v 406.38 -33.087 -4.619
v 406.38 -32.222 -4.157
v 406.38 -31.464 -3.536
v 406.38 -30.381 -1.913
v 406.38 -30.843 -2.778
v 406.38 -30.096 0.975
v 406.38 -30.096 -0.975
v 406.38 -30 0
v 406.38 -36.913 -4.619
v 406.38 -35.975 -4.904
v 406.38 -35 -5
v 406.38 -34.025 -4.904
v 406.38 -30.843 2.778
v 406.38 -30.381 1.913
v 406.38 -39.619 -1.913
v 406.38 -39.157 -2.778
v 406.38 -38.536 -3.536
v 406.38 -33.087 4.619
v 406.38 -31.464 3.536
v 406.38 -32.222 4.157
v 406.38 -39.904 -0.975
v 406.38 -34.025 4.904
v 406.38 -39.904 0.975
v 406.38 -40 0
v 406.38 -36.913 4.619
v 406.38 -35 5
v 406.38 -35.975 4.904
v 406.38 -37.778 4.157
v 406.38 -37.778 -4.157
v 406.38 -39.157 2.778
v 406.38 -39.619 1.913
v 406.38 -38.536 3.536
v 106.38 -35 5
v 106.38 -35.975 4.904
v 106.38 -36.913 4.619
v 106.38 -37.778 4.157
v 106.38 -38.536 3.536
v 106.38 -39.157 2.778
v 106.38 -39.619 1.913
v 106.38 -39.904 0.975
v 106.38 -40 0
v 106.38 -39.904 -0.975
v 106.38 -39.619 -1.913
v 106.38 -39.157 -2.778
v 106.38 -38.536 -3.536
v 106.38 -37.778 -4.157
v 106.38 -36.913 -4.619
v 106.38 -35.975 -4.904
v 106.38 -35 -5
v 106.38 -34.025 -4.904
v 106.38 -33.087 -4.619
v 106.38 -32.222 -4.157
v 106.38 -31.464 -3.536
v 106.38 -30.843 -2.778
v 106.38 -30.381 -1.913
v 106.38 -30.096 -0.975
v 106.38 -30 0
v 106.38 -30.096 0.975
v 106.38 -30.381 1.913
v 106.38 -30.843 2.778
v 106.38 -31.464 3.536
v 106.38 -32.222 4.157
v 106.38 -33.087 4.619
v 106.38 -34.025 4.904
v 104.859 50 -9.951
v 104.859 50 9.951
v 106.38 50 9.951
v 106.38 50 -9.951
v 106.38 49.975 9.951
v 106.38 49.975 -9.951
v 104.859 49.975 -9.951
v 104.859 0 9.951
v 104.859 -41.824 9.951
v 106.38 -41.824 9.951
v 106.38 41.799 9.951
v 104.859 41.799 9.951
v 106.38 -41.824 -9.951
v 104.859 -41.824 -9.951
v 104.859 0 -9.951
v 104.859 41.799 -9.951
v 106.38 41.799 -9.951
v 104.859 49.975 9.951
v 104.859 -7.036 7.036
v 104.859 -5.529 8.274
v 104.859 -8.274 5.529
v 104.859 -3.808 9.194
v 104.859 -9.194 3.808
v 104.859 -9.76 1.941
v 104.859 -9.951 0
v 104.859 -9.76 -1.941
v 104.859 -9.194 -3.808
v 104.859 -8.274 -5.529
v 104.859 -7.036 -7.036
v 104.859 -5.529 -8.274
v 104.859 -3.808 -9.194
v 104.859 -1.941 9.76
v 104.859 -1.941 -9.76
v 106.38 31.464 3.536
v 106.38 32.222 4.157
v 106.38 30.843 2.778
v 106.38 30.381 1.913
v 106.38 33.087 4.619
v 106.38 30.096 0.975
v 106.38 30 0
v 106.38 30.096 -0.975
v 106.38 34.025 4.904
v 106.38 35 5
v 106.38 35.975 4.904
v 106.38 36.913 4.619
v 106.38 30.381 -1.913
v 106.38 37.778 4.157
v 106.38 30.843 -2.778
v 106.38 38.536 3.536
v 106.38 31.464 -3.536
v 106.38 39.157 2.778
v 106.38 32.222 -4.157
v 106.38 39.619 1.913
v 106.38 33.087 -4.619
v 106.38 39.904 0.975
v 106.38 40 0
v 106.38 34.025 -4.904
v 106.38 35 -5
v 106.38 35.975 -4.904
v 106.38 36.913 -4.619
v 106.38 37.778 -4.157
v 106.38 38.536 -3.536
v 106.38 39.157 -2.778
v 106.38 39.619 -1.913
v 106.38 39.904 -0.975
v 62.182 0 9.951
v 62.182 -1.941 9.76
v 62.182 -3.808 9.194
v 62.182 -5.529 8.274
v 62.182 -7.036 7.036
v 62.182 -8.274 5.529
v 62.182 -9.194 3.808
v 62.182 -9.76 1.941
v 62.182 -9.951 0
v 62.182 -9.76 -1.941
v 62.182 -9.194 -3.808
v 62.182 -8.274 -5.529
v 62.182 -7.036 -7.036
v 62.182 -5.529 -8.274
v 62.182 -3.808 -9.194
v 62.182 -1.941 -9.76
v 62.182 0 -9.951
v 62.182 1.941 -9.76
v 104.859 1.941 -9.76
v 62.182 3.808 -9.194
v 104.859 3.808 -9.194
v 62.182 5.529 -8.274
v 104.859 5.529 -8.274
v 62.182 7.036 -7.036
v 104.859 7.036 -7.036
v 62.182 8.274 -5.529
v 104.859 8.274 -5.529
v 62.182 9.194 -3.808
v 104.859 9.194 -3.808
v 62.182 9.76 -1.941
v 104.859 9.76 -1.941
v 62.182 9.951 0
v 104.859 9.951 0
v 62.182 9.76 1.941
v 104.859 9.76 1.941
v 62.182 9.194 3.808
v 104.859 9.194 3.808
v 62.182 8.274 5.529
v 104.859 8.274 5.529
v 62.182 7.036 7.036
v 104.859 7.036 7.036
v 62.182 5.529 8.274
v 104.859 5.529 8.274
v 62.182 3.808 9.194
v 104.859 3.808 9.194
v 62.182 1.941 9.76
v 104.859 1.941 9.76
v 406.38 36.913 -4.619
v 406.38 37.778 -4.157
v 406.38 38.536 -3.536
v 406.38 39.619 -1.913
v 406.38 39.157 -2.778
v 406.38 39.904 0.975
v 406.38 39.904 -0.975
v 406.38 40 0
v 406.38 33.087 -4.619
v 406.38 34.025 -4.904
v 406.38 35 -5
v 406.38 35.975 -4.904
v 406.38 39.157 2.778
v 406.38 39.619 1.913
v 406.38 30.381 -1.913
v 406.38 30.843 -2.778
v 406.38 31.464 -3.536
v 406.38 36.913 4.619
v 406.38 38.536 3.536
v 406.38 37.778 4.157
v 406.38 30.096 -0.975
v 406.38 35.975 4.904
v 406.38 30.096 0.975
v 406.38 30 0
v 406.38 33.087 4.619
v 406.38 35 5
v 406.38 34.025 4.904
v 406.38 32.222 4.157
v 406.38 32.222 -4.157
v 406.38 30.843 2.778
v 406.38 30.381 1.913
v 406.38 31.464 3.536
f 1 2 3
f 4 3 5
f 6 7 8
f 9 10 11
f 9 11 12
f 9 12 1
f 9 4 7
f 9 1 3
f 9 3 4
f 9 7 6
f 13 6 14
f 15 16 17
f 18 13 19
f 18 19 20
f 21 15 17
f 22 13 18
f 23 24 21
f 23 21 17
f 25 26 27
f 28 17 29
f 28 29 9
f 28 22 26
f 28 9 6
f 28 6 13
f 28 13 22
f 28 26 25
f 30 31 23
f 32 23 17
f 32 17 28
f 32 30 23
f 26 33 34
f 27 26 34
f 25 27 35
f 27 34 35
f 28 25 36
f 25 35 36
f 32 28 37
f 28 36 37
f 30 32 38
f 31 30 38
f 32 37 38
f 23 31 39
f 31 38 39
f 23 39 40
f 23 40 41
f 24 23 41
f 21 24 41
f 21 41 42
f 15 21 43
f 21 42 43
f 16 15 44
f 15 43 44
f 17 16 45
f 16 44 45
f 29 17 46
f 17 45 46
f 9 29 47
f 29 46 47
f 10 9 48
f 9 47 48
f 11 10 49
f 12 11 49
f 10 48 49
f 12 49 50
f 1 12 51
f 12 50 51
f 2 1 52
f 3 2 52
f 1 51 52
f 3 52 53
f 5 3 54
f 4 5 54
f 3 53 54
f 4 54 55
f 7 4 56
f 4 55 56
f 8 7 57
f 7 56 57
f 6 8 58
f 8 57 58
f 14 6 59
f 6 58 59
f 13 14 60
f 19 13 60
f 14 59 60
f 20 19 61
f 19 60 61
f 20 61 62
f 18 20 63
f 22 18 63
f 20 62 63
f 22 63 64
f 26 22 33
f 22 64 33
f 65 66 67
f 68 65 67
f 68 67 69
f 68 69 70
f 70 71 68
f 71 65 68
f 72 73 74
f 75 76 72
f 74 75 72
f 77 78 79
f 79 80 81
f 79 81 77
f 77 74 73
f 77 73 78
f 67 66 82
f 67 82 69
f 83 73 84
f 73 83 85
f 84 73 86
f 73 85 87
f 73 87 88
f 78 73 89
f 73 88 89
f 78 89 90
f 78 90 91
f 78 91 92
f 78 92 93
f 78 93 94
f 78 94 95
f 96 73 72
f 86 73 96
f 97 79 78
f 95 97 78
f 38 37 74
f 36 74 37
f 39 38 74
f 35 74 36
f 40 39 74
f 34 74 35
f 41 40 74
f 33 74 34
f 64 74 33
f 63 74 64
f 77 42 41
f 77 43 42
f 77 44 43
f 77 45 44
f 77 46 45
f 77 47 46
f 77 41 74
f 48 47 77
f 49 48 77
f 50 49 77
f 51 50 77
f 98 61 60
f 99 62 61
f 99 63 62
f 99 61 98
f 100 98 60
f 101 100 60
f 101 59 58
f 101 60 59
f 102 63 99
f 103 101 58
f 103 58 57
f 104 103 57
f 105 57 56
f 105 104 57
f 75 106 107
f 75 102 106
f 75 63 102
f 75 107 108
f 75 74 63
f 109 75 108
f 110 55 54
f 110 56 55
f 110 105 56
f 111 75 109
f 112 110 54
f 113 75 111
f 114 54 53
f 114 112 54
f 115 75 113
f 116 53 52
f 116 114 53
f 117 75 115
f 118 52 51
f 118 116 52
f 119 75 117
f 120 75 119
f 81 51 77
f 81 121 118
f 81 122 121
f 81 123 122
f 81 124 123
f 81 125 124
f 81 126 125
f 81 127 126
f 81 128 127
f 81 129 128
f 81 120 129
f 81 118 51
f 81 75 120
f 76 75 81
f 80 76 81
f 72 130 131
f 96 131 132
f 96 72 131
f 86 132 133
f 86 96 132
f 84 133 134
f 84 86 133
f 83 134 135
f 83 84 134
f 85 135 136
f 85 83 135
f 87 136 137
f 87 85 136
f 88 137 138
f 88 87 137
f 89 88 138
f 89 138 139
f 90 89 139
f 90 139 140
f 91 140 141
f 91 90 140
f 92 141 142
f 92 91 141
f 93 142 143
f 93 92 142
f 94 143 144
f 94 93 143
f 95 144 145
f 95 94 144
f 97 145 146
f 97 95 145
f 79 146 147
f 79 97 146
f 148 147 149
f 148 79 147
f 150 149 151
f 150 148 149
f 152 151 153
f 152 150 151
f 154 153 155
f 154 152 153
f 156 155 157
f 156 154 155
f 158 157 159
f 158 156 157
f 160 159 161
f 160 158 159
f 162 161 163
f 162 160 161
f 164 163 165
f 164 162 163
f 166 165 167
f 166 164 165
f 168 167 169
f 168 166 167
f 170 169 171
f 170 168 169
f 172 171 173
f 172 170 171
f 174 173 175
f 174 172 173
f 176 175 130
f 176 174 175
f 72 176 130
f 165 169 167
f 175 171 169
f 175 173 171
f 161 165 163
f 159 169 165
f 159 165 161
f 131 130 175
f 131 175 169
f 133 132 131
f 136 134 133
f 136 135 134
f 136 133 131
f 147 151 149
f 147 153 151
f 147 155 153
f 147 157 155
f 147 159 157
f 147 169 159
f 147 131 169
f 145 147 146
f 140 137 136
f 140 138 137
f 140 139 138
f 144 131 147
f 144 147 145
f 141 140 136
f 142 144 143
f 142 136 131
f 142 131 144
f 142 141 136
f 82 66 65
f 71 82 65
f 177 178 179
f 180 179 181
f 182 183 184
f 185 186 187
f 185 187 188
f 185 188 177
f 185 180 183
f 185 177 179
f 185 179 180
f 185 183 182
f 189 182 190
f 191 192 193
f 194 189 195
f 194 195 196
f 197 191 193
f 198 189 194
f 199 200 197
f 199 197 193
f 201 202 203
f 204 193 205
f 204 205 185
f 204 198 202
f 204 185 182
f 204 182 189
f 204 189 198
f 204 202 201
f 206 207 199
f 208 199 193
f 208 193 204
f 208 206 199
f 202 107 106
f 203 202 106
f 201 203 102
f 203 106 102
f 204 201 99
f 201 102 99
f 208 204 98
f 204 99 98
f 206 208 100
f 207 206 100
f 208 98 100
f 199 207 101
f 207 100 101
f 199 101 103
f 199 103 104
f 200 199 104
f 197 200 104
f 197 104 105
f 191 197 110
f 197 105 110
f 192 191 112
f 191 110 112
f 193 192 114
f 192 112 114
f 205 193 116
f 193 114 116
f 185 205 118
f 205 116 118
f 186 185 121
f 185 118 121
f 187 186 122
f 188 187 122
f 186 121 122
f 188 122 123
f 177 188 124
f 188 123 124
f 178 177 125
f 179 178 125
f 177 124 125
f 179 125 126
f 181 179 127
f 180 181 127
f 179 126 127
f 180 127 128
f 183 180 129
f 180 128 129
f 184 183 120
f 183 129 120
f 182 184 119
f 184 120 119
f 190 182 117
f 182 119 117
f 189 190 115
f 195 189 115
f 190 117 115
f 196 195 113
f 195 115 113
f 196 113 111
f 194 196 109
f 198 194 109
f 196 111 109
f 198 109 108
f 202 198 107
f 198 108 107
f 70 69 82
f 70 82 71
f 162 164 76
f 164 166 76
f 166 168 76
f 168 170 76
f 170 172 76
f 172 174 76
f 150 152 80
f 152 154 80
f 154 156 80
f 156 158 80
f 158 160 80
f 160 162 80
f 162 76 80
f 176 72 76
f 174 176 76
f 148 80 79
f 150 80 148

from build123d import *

# Parameters (mm, degrees)
SKETCH1_W           = 42.676374934
SKETCH1_H           = 9.951050175
SKETCH2_W           = 1.52161308
SKETCH2_H           = 19.90210035
BOSS_EXTRUDE1_DEPTH = 50
SKETCH3_R           = 5
BOSS_EXTRUDE2_DEPTH = 300
SKETCH4_W           = 19.90210035
SKETCH4_H           = 8.176332163
CUT_EXTRUDE1_DEPTH  = 305.300876436


with BuildPart() as part:
    # Sketch1 → Revolve1 (revolve)
    with BuildSketch(Plane.XY):
        with Locations((83.520419131, 4.975525088)):
            Rectangle(SKETCH1_W, SKETCH1_H)
    revolve(axis=Axis((62.182231664, 0, 0), (1, 0, 0)))

    # Sketch2 → Boss-Extrude1 (add, symmetric)
    with BuildSketch(Plane(origin=(0, 0, 0), x_dir=(1, 0, 0), z_dir=(0, 1, 0))):
        with Locations((105.619413138, 0)):
            Rectangle(SKETCH2_W, SKETCH2_H)
    extrude(amount=BOSS_EXTRUDE1_DEPTH, both=True)

    # Sketch3 → Boss-Extrude2 (add)
    with BuildSketch(Plane(origin=(106.380219678, 0, 0), x_dir=(0, 0, -1), z_dir=(1, 0, 0))):
        with Locations((0, 35)):
            Circle(SKETCH3_R)
        with Locations((0, -35)):
            Circle(SKETCH3_R)
    extrude(amount=BOSS_EXTRUDE2_DEPTH)

    # Sketch4 → Cut-Extrude1 (cut, through all)
    with BuildSketch(Plane(origin=(106.380219678, 0, 0), x_dir=(0, 0, -1), z_dir=(1, 0, 0))):
        with Locations((0, -45.911833919)):
            Rectangle(SKETCH4_W, SKETCH4_H)
        with Locations((0, 45.886757364)):
            Rectangle(SKETCH4_W, SKETCH4_H)
    extrude(amount=-CUT_EXTRUDE1_DEPTH, mode=Mode.SUBTRACT)


with BuildPart() as cut_extrude1_piece_1:
    # of the separate pieces the step leaves, piece 1, a body of its own (cut_extrude1_pieces)
    add(part.part.solids().sort_by_distance((104.858606598, 9.951050175, 0))[0])


with BuildPart() as cut_extrude1_piece_2:
    # of the separate pieces the step leaves, piece 2, a body of its own (cut_extrude1_pieces)
    add(part.part.solids().sort_by_distance((104.858606598, 49.974923446, 9.951050175))[0])


solid = Compound([cut_extrude1_piece_1.part, cut_extrude1_piece_2.part])
